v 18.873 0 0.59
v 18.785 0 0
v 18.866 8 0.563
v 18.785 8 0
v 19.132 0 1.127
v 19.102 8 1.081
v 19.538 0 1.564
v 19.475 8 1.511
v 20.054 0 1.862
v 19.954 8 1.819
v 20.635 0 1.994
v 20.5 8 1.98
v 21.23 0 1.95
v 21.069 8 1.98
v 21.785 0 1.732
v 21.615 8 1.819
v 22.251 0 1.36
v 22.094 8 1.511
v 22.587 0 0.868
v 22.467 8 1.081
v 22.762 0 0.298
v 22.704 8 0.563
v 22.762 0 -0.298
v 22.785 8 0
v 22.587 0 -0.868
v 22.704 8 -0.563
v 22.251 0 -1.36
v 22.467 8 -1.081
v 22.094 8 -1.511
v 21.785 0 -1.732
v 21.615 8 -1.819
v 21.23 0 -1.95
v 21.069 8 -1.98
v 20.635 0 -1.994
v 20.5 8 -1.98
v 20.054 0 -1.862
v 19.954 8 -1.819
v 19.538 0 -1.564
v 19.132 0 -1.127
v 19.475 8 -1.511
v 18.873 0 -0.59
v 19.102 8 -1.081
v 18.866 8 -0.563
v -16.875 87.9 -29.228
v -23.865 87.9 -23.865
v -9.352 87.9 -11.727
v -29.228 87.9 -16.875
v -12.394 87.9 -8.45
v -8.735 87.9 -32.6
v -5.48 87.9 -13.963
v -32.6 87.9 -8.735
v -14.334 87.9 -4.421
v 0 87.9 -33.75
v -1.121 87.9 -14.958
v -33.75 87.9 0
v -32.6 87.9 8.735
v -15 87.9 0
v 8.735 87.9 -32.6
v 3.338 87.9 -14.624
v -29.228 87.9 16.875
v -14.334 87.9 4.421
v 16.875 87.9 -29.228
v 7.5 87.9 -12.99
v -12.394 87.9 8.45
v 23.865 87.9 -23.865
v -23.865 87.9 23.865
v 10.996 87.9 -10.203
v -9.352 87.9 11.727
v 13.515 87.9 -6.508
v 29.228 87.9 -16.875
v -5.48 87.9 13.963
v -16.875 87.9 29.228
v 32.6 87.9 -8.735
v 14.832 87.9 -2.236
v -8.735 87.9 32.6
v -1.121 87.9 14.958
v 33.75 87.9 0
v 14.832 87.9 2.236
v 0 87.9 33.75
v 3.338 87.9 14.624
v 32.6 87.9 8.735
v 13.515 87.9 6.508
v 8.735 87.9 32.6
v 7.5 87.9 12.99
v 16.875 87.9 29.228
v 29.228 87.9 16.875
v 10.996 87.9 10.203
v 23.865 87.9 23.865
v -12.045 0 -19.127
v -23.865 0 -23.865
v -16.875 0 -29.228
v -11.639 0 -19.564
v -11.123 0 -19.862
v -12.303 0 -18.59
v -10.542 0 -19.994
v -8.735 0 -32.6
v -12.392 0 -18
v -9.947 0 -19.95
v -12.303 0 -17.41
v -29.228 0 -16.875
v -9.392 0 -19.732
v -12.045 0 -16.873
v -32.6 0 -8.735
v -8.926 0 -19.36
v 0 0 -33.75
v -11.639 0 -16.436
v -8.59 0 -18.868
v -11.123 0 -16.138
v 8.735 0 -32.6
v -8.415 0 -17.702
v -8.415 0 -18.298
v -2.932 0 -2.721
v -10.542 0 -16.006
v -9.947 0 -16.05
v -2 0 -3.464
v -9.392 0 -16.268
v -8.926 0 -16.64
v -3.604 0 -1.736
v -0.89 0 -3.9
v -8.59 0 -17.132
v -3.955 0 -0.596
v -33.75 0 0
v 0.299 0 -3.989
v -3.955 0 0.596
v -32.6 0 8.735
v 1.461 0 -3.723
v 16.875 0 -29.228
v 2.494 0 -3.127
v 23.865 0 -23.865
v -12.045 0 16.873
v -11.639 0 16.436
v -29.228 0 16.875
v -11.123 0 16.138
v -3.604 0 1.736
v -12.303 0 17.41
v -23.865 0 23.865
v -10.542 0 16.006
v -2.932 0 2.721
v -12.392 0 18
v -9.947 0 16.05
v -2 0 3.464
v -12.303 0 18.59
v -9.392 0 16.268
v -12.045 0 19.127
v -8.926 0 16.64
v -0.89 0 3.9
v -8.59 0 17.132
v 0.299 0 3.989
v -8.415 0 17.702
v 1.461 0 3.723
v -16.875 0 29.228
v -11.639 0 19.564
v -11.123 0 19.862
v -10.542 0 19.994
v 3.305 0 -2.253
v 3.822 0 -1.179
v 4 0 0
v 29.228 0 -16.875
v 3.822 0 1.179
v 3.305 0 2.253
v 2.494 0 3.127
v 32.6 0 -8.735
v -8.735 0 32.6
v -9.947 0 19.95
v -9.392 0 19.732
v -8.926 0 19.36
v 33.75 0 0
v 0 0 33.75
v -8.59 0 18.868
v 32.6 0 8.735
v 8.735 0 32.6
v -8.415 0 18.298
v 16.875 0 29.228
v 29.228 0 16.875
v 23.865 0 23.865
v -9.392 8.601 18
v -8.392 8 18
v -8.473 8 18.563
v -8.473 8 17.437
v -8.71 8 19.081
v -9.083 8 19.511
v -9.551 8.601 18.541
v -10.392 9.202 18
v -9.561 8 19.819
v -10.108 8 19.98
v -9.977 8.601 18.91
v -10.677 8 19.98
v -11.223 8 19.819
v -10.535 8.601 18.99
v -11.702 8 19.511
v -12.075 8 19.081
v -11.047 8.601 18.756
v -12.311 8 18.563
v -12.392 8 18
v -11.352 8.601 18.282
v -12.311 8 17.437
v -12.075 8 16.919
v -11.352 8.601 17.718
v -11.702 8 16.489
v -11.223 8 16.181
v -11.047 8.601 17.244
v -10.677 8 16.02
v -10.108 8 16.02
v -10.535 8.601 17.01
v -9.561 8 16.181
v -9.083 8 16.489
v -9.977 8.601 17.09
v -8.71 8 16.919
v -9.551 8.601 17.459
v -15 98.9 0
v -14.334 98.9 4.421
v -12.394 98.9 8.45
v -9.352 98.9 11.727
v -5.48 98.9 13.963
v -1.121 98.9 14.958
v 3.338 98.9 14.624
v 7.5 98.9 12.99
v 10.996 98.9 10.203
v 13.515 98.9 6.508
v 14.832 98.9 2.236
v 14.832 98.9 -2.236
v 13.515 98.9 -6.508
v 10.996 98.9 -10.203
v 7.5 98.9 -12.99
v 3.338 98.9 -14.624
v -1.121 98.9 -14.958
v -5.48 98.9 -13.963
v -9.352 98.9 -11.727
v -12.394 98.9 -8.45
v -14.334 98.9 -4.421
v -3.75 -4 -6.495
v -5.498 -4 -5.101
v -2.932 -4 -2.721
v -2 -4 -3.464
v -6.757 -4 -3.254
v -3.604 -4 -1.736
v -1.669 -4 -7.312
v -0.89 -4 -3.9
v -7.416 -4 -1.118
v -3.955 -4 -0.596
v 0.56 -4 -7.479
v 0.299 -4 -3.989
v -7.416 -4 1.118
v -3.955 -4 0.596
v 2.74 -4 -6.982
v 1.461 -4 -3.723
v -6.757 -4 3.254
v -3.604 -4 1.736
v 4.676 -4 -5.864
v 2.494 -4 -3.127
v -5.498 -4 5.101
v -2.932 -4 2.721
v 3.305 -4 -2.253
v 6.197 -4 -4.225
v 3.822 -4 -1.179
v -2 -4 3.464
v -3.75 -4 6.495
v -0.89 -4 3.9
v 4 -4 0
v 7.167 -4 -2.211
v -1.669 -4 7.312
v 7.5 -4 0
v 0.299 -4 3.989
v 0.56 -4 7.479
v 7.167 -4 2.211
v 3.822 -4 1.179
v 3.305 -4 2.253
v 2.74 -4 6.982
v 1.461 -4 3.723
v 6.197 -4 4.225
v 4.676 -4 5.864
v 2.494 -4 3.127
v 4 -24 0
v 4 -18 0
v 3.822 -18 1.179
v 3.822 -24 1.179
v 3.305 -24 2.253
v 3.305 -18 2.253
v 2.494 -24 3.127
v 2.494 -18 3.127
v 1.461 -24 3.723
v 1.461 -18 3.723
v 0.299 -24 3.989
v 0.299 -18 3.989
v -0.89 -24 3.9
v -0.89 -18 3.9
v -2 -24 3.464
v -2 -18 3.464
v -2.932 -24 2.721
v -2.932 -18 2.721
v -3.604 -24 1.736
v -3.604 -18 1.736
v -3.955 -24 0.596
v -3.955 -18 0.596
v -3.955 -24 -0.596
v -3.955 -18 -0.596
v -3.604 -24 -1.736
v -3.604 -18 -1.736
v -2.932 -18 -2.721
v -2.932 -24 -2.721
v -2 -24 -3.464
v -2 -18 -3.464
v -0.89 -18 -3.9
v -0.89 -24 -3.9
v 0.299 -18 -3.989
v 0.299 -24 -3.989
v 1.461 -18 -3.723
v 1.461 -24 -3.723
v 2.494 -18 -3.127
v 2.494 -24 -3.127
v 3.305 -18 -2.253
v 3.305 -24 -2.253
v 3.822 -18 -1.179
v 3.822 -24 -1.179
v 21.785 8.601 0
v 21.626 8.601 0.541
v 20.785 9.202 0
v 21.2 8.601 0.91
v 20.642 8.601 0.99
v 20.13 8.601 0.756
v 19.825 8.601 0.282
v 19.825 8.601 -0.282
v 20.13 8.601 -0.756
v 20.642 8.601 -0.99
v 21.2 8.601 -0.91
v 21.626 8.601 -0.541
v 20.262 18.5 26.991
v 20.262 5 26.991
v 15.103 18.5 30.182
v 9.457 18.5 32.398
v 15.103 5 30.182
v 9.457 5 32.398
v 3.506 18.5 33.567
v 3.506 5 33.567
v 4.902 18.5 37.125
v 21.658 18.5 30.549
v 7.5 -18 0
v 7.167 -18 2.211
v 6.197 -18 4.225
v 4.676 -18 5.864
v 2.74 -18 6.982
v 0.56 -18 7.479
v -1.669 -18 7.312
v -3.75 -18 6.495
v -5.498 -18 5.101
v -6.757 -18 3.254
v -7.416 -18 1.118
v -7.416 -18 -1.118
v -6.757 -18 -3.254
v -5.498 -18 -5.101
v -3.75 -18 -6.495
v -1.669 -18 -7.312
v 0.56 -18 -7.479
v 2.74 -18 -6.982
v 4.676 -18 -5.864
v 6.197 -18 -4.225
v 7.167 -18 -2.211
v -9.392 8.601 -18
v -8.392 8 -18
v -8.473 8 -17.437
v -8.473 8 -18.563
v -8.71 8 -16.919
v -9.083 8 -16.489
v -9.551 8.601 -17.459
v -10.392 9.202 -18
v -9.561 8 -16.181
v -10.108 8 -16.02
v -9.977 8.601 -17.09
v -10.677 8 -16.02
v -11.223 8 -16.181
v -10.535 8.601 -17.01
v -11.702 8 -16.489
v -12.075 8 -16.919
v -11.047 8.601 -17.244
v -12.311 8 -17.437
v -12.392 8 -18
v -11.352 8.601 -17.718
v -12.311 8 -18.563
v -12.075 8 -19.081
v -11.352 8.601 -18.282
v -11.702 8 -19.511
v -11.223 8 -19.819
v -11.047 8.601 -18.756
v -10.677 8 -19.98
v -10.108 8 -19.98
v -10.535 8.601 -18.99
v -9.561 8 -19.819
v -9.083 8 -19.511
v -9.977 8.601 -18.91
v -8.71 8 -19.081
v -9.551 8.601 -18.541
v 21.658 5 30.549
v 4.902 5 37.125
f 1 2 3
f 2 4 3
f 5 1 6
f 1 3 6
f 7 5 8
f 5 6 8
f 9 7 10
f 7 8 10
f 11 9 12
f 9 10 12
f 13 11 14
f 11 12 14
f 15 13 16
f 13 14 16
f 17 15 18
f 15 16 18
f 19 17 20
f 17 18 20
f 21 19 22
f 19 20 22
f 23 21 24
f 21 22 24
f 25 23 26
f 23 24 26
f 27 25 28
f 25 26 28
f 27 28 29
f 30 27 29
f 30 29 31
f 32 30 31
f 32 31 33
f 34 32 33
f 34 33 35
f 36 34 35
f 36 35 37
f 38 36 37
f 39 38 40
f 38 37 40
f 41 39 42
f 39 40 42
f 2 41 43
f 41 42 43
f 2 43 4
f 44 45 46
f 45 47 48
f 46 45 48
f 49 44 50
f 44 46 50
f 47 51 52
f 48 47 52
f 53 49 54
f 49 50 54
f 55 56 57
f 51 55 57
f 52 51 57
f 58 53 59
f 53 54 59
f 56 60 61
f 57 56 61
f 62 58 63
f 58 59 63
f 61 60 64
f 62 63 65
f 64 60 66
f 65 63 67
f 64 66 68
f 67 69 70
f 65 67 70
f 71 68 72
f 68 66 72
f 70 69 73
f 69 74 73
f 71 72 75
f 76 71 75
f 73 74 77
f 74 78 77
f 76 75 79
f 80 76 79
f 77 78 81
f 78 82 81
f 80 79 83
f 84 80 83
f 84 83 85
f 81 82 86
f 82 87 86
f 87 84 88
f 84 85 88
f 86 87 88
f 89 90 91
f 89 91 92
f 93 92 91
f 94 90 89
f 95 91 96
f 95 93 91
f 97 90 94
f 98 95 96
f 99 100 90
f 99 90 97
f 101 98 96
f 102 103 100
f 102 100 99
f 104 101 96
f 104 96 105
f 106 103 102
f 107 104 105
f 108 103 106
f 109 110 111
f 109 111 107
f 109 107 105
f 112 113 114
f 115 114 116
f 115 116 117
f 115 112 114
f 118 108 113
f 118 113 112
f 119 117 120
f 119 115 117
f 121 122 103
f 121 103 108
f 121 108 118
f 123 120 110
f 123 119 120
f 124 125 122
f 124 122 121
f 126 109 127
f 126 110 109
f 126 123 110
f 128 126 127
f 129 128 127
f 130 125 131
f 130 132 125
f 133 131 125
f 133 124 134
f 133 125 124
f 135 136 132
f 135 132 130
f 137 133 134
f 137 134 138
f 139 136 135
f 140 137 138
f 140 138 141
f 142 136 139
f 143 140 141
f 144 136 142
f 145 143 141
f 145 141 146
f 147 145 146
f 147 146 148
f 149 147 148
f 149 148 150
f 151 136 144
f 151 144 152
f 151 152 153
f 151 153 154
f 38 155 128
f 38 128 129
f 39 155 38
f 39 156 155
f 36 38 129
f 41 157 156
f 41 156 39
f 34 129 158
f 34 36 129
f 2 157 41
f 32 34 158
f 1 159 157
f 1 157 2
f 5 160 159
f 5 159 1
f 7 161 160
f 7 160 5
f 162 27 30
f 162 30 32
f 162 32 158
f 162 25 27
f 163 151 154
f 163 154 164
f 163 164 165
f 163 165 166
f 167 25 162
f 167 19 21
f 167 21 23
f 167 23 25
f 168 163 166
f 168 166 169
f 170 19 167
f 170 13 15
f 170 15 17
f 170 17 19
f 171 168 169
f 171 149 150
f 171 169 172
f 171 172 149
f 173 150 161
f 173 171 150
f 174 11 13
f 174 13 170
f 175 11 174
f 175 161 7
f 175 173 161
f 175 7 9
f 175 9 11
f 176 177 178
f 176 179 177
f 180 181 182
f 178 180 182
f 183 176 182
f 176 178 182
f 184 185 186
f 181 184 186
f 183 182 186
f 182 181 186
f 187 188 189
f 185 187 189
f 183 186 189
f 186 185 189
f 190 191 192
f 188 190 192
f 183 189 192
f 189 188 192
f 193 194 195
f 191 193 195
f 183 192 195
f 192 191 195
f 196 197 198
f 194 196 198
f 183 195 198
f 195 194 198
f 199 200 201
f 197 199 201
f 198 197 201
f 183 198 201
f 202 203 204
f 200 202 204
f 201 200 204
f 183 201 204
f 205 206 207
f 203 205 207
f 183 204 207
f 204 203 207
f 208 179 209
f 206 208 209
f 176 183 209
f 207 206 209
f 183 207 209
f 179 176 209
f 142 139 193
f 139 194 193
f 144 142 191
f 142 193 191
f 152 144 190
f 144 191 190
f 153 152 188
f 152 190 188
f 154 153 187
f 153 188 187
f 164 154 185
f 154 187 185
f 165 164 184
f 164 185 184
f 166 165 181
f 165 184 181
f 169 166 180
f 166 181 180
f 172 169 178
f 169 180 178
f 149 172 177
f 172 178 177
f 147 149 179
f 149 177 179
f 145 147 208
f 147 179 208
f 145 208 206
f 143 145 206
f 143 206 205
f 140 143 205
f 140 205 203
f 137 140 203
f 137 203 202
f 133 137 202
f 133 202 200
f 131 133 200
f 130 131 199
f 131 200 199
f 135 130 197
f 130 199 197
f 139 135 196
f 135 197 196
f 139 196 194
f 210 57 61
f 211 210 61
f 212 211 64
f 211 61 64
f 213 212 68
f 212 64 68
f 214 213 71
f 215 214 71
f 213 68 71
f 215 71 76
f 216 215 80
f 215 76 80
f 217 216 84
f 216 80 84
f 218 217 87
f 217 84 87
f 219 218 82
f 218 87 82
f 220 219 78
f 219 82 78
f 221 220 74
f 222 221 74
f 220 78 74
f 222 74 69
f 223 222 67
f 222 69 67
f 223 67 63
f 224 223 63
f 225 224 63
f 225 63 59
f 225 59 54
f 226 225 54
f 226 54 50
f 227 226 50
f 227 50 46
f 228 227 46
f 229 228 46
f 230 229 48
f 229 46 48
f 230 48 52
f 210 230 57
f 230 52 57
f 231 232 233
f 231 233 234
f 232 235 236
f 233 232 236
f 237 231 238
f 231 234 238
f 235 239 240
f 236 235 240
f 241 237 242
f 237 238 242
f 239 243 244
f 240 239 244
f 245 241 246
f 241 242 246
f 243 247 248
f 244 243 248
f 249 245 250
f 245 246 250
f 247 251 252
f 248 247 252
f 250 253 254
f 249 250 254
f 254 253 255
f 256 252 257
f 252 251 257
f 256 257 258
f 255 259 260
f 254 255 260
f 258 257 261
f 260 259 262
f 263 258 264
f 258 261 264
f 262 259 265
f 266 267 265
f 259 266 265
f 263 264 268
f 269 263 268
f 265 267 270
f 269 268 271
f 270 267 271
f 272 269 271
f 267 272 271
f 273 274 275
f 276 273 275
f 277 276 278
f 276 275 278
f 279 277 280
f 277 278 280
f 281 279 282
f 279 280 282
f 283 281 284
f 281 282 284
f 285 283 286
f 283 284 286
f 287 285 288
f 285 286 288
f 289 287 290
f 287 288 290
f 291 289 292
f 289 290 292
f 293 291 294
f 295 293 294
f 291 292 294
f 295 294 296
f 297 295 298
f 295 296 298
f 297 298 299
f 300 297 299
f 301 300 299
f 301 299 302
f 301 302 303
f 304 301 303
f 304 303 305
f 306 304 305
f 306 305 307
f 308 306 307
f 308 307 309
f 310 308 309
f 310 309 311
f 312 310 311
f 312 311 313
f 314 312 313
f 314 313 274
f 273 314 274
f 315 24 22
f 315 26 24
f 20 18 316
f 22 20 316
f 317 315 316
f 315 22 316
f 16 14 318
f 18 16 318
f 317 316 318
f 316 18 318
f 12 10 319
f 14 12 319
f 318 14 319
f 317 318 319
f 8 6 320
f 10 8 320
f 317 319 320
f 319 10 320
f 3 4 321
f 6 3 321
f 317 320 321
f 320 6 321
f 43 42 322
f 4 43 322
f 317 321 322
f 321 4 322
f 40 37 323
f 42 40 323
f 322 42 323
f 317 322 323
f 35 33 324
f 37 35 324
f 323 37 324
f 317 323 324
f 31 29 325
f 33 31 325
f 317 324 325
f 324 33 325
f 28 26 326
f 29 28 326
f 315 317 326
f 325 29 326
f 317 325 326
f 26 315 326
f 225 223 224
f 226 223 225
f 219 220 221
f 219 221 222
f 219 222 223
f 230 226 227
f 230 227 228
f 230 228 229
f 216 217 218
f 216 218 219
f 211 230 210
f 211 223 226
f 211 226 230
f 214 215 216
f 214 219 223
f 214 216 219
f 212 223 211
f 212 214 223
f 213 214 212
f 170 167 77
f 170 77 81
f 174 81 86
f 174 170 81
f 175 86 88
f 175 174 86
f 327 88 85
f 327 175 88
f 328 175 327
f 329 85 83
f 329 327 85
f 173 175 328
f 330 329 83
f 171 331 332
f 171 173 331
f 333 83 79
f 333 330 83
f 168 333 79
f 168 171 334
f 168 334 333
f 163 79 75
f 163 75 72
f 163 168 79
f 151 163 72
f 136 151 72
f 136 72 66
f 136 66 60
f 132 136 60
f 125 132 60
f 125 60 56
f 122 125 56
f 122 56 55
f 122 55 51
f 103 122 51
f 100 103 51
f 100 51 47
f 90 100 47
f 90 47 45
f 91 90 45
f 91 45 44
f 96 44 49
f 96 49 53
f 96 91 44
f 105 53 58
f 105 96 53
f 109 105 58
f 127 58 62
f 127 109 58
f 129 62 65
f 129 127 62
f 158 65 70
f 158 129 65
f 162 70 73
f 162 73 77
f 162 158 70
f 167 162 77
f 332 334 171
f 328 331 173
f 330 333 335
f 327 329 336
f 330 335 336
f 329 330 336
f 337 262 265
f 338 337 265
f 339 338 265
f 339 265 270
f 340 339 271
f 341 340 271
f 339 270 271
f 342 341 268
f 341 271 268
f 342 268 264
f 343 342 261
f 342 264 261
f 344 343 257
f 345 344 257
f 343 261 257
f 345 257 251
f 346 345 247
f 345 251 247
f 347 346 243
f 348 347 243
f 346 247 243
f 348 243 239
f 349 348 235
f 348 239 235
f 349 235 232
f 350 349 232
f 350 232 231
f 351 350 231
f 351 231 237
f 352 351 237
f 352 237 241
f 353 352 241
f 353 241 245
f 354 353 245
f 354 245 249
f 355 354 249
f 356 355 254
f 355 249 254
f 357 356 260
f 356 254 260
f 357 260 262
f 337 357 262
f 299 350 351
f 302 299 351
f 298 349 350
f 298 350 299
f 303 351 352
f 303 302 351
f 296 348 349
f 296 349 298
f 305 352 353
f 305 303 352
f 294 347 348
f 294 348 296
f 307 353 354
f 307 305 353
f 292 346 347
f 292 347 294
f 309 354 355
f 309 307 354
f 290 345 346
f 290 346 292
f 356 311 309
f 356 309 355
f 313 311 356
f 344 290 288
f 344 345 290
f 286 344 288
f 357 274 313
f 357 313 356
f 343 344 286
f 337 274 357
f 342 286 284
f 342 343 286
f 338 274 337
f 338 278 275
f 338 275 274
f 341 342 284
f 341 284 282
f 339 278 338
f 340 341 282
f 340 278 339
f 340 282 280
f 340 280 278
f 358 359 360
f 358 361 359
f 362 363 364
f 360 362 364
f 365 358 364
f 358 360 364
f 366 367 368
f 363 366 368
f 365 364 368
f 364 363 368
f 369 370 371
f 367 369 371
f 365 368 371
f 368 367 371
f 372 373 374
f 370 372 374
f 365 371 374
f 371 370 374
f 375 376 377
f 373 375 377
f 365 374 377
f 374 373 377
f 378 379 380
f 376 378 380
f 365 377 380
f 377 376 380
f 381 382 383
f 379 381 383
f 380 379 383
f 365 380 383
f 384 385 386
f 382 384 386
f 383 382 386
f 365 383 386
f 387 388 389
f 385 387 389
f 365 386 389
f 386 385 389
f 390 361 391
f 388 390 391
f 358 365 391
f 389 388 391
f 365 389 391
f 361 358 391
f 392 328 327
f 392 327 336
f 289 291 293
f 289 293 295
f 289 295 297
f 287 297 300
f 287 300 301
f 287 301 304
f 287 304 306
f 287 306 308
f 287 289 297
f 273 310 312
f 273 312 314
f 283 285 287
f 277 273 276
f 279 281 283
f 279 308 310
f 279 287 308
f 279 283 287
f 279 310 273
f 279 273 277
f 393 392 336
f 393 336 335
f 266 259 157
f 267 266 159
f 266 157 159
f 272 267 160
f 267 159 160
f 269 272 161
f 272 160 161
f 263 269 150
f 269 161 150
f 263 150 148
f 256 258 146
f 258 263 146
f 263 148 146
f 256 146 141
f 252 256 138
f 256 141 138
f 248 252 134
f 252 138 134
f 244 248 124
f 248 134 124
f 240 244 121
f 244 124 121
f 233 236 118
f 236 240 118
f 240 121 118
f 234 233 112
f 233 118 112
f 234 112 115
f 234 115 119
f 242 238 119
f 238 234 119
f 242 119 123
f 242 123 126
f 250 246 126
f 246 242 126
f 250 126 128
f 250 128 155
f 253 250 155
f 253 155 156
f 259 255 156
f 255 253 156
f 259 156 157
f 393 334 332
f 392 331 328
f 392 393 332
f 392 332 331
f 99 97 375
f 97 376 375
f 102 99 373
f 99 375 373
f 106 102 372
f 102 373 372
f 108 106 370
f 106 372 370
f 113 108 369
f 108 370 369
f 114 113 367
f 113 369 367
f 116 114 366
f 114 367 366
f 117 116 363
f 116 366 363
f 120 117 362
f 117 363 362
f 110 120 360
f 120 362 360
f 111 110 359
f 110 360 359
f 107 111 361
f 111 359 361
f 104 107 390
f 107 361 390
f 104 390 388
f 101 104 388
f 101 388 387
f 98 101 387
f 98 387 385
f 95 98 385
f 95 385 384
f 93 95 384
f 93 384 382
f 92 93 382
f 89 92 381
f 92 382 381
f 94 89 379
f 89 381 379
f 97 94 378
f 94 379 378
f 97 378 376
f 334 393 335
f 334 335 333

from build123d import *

# Parameters (mm, degrees)
F0_R      = 33.75
F1_DEPTH  = 87.9
F2_R      = 15
F3_DEPTH  = 11
F4_R      = 4
F5_DEPTH  = 24
F6_D      = 4
F6_DEPTH  = 8
F6_TIP    = 1.2017212381
F8_R      = 7.5
F9_DEPTH  = 14
F12_DEPTH = 13.5


with BuildPart() as f1:
    # F0 (on Front) → F1 (new body)
    with BuildSketch(Plane.XZ):
        Circle(F0_R)
    extrude(amount=-F1_DEPTH)

    # F2 (on face) → F3 (join)
    with BuildSketch(Plane(origin=(0, 87.9, 0), x_dir=(-1, 0, 0), z_dir=(0, 1, 0))):
        Circle(F2_R)
    extrude(amount=F3_DEPTH)

    # F4 (on face) → F5 (join)
    with BuildSketch(Plane.XZ):
        Circle(F4_R)
    extrude(amount=F5_DEPTH)

    # F6
    with Locations(Plane.XZ):
        with Locations((20.7846096908, 0), (-10.3923048454, 18), (-10.3923048454, -18)):
            Hole(F6_D / 2, depth=F6_DEPTH)
            with Locations((0, 0, -(F6_DEPTH + F6_TIP / 2))):  # 118° drill point
                Cone(0, F6_D / 2, F6_TIP, mode=Mode.SUBTRACT)

    # F8 (on offset) → F9 (join)
    with BuildSketch(Plane.XZ.offset(4)):
        Circle(F8_R)
    extrude(amount=F9_DEPTH)

    # F11 (on offset) → F12 (join)
    with BuildSketch(Plane.XZ.offset(-5)):
        with BuildLine():
            Line((20.2615004909, 26.9913708036), (21.6578633283, 30.5492955083))
            Line((21.6578633283, 30.5492955083), (4.9021042855, 37.1253535145))
            Line((4.9021042855, 37.1253535145), (3.5057414481, 33.5674288098))
            ThreePointArc((3.5057414481, 33.5674288098), (12.3301087616, 31.4170482052), (20.2615004909, 26.9913708036))
        make_face()
    extrude(amount=-F12_DEPTH)


solid = f1.part
